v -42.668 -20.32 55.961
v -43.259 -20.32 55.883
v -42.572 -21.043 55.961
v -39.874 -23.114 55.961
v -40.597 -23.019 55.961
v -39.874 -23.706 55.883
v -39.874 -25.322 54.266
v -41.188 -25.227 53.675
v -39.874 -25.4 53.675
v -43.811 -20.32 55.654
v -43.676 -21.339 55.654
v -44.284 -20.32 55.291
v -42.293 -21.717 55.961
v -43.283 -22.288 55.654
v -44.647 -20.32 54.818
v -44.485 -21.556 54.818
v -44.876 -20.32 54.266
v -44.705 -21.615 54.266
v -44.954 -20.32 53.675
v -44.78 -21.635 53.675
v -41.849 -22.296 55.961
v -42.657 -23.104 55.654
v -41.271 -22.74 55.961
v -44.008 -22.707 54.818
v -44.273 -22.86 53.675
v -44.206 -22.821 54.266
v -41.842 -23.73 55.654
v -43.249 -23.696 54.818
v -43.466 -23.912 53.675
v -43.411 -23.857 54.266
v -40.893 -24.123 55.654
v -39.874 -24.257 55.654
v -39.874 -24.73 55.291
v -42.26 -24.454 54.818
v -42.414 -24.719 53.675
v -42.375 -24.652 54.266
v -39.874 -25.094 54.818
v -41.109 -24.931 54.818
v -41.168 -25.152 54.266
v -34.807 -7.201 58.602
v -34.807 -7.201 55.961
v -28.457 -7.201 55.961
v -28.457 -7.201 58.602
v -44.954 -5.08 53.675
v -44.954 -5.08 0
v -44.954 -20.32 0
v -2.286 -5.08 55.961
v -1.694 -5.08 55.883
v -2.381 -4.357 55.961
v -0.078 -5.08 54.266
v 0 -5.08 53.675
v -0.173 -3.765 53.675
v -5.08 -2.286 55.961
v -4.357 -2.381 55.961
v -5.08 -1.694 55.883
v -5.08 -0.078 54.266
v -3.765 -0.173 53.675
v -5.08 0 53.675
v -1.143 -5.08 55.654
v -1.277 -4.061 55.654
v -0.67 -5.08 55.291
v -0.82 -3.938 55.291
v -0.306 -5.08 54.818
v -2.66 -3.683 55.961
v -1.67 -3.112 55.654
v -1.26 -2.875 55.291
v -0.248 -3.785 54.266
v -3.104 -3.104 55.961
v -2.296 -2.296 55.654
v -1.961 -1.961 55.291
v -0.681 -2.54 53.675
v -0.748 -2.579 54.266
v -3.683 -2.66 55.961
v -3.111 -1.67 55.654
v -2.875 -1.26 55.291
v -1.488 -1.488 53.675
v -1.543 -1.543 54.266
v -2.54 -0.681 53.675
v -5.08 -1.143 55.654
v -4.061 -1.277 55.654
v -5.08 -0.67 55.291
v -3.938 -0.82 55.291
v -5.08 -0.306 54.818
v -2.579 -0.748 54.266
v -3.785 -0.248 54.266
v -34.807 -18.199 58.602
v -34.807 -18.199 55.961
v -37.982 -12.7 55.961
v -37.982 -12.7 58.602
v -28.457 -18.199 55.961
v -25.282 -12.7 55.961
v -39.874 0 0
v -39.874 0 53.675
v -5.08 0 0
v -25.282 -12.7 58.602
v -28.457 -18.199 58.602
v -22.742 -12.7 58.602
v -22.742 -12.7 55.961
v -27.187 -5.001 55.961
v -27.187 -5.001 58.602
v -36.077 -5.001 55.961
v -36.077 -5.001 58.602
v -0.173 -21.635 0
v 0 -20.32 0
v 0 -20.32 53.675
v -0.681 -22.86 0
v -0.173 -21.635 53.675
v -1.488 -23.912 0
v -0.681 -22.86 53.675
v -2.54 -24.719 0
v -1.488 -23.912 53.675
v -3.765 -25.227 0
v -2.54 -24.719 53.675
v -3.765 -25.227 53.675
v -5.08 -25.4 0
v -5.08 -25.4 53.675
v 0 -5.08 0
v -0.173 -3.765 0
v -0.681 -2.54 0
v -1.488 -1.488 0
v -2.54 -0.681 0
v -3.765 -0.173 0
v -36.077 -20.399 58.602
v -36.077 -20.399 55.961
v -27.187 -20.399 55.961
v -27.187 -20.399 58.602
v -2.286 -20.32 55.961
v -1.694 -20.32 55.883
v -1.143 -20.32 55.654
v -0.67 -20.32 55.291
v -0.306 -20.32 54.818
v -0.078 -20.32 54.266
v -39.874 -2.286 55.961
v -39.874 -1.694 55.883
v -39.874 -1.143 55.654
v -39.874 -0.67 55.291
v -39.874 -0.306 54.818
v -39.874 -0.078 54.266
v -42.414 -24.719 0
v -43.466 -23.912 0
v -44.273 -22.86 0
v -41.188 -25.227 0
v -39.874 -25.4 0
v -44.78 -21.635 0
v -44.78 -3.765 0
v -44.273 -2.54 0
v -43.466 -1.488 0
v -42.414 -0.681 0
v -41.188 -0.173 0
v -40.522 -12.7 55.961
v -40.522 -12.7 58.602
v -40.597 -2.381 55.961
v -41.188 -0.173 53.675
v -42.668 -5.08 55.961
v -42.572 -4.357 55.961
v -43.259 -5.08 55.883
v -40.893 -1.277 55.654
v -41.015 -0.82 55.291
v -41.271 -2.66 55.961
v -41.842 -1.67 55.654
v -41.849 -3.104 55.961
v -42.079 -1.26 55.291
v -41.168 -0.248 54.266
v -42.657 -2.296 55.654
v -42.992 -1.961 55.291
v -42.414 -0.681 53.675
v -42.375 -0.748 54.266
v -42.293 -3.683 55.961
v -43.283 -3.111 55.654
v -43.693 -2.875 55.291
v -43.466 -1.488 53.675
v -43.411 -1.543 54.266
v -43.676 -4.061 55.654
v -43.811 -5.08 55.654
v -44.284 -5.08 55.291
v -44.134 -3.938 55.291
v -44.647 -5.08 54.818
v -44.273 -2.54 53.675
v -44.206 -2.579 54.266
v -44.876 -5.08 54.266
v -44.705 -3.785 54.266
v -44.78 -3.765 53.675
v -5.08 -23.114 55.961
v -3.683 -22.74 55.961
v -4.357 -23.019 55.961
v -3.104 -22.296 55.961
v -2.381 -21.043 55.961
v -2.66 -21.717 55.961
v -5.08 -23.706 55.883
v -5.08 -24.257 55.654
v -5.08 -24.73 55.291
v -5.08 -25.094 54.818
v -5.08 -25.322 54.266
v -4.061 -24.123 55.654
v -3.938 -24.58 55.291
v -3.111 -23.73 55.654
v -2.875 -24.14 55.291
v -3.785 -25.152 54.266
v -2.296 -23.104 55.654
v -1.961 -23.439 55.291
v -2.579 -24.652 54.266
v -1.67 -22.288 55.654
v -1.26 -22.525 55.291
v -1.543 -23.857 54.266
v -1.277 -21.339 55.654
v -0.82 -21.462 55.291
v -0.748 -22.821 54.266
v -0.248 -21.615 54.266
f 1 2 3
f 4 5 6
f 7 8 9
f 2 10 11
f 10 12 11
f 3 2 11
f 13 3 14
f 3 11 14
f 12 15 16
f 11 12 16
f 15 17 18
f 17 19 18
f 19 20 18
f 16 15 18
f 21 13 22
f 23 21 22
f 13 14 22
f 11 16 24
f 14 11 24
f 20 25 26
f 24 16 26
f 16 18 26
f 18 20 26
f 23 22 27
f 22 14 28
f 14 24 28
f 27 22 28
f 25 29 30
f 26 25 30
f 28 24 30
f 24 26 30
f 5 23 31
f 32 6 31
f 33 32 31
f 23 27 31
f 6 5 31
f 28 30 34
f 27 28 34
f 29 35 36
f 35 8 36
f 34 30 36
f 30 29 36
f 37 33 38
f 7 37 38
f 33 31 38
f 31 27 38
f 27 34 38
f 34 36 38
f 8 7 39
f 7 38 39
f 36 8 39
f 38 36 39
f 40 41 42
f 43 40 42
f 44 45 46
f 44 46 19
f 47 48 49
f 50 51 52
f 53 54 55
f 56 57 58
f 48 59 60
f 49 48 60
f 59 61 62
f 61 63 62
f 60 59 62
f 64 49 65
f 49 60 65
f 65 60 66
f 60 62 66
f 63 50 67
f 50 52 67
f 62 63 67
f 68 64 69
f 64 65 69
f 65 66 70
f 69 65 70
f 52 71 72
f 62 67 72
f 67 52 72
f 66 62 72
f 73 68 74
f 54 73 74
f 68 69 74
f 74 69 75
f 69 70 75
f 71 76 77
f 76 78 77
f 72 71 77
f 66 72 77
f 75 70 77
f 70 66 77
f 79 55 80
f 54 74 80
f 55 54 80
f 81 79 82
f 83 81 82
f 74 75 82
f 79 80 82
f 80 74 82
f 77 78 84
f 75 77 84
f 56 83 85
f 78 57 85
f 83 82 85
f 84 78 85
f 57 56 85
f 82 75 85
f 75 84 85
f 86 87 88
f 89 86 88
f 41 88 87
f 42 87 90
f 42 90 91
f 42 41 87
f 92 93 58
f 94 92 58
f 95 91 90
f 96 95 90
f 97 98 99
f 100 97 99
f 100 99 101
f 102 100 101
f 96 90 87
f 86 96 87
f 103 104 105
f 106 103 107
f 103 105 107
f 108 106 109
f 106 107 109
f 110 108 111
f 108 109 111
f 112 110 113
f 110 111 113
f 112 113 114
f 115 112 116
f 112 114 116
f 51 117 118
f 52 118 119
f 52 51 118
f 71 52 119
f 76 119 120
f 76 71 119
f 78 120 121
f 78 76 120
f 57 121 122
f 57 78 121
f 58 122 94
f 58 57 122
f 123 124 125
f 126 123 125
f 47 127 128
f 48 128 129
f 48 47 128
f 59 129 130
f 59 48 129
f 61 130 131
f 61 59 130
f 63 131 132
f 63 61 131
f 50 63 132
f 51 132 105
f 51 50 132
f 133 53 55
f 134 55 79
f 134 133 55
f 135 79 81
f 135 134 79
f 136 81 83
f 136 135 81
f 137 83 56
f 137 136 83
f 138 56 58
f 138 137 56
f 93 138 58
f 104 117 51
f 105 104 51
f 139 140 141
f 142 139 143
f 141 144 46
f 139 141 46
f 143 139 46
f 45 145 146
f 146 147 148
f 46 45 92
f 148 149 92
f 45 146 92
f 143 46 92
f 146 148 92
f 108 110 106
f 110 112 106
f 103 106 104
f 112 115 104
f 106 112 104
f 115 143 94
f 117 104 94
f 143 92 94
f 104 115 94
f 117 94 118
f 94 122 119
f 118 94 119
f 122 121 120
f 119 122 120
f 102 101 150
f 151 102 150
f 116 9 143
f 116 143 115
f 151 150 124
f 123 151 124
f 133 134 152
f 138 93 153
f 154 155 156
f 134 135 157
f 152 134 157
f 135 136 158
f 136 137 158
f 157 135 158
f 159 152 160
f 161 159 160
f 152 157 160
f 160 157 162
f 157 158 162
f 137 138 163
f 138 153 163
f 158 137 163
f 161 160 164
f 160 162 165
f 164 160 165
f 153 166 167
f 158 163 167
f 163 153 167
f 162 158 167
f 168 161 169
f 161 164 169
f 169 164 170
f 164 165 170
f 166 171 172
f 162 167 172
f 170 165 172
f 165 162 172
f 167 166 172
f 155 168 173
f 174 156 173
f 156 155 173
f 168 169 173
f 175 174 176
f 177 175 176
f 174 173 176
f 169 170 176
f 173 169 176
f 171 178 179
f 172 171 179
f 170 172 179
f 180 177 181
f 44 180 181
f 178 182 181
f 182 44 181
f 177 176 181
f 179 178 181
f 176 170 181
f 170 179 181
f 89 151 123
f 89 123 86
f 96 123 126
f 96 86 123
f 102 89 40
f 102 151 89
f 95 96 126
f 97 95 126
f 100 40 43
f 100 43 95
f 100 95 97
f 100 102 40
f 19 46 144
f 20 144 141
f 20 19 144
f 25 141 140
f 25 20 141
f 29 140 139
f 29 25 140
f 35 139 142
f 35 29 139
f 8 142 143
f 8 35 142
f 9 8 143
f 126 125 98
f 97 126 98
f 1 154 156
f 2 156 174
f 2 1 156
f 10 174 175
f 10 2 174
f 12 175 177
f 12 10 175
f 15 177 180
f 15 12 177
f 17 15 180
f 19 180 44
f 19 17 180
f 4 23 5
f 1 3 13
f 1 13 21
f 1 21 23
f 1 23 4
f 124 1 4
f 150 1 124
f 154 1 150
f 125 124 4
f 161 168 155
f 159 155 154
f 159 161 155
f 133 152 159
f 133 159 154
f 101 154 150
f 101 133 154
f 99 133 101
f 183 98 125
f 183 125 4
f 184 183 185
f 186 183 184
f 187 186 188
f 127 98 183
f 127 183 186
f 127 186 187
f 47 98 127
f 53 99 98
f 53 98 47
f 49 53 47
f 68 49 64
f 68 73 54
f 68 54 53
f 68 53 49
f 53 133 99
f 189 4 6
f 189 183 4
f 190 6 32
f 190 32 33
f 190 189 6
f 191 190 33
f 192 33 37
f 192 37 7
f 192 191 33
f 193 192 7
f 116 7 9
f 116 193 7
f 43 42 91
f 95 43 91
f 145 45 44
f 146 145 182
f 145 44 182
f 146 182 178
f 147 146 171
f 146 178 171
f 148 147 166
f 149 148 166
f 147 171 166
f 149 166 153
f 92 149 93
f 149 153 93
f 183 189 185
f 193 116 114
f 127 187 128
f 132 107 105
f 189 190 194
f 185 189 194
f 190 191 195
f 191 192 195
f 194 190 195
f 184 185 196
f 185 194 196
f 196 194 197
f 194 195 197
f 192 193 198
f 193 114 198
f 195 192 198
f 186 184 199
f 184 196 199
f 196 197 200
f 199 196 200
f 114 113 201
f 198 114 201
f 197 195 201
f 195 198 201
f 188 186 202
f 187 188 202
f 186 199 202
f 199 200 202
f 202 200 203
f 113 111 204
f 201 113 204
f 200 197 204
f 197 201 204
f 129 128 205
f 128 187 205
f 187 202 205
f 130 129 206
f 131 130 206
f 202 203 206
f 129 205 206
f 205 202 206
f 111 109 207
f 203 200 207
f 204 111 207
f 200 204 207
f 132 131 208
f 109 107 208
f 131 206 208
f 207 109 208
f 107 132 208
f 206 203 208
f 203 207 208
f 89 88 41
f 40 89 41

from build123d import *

# Parameters (mm, degrees)
F0_W     = 44.9535958469
F0_H     = 55.96075207
F1_DEPTH = 25.4
F2_R     = 5.08
F7_DEPTH = 2.6416
F8_R     = 2.286


# Not quite as in the source:
# - the program builds the solid bodies; features that only make, move or delete a surface that nothing else refers to are left out


with BuildPart() as f1:
    # F0 (on Front) → F1 (new body)
    with BuildSketch(Plane.XZ):
        with Locations((-22.4767979234, 27.980376035)):
            Rectangle(F0_W, F0_H)
    extrude(amount=F1_DEPTH)

    # F2
    f2_edges = [f1.edges().sort_by_distance(p)[0] for p in [
        (-44.953596, -25.4, 27.980376),
        (-44.953596, 0, 27.980376),
        (0, -25.4, 27.980376),
        (0, 0, 27.980376),
    ]]
    fillet(f2_edges, radius=F2_R)

    # F6 (on face) → F7 (join)
    with BuildSketch(Plane.XY.offset(55.96075207)):
        Polygon((-36.077086072, -5.0010341604), (-40.522086072, -12.7), (-36.077086072, -20.3989658396), (-27.187086072, -20.3989658396), (-22.742086072, -12.7), (-27.187086072, -5.0010341604), align=None)
        Polygon((-34.807086072, -18.199261314), (-37.982086072, -12.7), (-34.807086072, -7.200738686), (-28.457086072, -7.200738686), (-25.282086072, -12.7), (-28.457086072, -18.199261314), align=None, mode=Mode.SUBTRACT)
    extrude(amount=F7_DEPTH)

    # F8
    f8_edges = [f1.edges().sort_by_distance(p)[0] for p in [
        (-22.476798, -25.4, 55.960752),
    ]]
    fillet(f8_edges, radius=F8_R)


solid = f1.part
